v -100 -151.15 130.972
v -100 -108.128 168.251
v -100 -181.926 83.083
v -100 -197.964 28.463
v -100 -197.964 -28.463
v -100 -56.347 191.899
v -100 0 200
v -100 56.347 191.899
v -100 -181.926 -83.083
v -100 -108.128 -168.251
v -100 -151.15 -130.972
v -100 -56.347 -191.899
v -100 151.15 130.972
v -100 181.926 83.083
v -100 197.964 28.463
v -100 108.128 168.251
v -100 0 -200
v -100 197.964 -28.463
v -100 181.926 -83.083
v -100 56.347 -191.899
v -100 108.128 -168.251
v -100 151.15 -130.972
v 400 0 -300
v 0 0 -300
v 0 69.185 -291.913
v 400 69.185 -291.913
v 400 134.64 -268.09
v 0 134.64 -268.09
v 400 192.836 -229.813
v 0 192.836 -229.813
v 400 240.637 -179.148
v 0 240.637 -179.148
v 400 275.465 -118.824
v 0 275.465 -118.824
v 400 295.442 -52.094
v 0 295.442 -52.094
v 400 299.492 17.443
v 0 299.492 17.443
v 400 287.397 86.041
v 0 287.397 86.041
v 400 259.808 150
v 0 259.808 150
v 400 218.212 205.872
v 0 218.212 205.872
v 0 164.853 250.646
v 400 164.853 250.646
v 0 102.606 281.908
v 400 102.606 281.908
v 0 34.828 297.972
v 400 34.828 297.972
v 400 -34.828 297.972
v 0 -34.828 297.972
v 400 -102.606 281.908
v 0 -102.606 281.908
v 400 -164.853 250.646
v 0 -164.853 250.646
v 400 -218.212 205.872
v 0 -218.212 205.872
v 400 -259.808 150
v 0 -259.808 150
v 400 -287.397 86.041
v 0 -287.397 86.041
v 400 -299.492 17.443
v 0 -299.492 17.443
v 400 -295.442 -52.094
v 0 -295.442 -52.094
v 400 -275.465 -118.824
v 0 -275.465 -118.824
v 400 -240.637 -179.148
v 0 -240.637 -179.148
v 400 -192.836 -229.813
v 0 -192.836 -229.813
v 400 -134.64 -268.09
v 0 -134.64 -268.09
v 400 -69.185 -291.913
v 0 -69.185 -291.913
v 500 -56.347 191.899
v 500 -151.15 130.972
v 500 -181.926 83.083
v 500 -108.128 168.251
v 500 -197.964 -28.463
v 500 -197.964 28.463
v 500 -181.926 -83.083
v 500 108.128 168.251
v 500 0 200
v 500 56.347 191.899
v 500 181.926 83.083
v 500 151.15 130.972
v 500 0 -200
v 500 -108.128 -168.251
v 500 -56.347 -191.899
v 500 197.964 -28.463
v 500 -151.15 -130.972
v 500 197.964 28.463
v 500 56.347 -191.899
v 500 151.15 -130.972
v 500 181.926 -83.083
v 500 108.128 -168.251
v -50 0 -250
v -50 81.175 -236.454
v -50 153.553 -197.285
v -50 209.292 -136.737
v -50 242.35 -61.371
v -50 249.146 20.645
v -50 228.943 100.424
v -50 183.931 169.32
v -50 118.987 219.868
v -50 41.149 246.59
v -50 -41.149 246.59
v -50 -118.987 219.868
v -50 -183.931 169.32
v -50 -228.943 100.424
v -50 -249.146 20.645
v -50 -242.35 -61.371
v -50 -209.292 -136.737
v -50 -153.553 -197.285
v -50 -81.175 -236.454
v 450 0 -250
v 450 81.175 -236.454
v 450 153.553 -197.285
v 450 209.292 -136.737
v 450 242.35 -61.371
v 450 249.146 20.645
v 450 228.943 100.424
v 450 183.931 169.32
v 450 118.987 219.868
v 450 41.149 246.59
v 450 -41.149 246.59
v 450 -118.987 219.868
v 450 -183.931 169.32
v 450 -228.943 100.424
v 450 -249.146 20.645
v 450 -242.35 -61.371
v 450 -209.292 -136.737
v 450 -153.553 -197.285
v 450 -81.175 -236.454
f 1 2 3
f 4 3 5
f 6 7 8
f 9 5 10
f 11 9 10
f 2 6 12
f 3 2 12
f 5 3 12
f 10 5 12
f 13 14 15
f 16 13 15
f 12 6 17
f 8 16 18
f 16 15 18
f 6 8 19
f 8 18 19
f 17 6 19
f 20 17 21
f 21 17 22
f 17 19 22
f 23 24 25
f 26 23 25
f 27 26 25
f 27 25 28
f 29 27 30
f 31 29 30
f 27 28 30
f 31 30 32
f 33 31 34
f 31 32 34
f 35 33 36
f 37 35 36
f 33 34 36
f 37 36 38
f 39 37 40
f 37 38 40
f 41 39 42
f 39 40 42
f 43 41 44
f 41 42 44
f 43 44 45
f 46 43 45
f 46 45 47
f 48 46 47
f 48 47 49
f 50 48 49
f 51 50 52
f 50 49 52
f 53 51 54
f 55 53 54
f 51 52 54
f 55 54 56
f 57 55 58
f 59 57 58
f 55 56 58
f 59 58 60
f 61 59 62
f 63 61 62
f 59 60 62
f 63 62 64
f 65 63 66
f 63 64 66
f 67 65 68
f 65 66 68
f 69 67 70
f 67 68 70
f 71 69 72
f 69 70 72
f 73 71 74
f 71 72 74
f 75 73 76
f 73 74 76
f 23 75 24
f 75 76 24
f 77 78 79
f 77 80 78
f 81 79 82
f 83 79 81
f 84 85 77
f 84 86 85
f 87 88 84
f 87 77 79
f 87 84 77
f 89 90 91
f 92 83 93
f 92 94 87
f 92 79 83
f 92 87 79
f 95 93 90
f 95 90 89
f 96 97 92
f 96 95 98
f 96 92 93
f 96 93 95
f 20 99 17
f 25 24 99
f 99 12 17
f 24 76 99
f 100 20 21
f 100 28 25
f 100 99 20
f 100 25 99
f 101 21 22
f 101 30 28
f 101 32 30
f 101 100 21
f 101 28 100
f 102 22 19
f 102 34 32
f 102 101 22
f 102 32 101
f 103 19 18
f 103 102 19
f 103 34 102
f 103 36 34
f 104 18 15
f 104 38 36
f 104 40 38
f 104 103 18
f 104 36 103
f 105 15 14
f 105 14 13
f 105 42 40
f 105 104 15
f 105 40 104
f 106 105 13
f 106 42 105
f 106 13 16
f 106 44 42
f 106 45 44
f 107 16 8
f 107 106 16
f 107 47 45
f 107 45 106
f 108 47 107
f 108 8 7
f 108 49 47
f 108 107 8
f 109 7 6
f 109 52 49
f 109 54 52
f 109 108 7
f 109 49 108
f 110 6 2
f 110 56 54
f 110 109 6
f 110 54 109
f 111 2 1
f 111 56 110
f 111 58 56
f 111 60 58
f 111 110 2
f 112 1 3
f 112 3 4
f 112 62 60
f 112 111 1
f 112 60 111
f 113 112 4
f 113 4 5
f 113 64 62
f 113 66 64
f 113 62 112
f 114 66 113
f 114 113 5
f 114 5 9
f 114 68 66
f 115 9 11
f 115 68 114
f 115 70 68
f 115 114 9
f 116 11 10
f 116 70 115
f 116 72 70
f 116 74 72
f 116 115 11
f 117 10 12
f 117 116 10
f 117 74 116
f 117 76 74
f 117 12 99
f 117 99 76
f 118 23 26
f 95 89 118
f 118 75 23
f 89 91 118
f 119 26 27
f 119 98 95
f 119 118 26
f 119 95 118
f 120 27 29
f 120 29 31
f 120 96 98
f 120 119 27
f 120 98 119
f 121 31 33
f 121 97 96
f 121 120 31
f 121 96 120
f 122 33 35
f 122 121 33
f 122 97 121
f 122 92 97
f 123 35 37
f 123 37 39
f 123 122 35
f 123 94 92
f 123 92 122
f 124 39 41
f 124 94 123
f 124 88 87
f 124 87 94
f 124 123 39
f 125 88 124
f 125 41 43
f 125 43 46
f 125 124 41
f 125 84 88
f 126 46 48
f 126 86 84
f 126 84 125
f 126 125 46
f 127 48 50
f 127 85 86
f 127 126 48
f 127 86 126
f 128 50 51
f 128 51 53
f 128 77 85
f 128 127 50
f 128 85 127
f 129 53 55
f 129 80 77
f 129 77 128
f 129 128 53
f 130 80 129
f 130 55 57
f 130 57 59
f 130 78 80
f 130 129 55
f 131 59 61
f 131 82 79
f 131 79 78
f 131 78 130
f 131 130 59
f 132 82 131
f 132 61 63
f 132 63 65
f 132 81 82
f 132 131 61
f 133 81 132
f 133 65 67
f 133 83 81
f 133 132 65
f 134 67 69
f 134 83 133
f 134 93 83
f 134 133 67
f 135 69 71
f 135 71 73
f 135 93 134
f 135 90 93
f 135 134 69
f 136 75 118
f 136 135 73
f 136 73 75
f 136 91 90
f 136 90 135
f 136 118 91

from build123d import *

# Parameters (mm, degrees)
SKETCH1_R           = 300
BOSS_EXTRUDE1_DEPTH = 400
SKETCH1_2_R         = 300
BOSS_EXTRUDE2_DEPTH = 100
BOSS_EXTRUDE2_DRAFT = -45
BOSS_EXTRUDE3_START = 400
SKETCH1_3_R         = 300
BOSS_EXTRUDE3_DEPTH = 100
BOSS_EXTRUDE3_TAPER = 45


with BuildPart() as part:
    # Sketch1 → Boss-Extrude1 (new body)
    with BuildSketch(Plane(origin=(0, 0, 0), x_dir=(0, 0, -1), z_dir=(1, 0, 0))):
        Circle(SKETCH1_R)
    extrude(amount=BOSS_EXTRUDE1_DEPTH)


with BuildPart() as boss_extrude2_tool:
    # Sketch1<2> → Boss-Extrude2 (with draft: the straight prism first)
    with BuildSketch(Plane(origin=(0, 0, 0), x_dir=(0, 0, -1), z_dir=(1, 0, 0))):
        Circle(SKETCH1_2_R)
    extrude(amount=-BOSS_EXTRUDE2_DEPTH)
    # Boss-Extrude2: the draft: its side faces are tilted about the plane it starts from
    boss_extrude2_sides = [boss_extrude2_tool.faces().sort_by_distance(p)[0] for p in [
        (-50, 0, 300),
    ]]
    draft(boss_extrude2_sides, Plane(origin=(0, 0, 0), x_dir=(0, 0, -1), z_dir=(1, 0, 0)), BOSS_EXTRUDE2_DRAFT)


with BuildPart() as part_1:
    add(part.part)

    # Boss-Extrude2: add boss_extrude2_tool
    add(boss_extrude2_tool.part)

    # Sketch1<3> → Boss-Extrude3 (add)
    with BuildSketch(Plane(origin=(0, 0, 0), x_dir=(0, 0, -1), z_dir=(1, 0, 0)).offset(BOSS_EXTRUDE3_START)):
        Circle(SKETCH1_3_R)
    extrude(amount=BOSS_EXTRUDE3_DEPTH, taper=BOSS_EXTRUDE3_TAPER)


solid = part_1.part
